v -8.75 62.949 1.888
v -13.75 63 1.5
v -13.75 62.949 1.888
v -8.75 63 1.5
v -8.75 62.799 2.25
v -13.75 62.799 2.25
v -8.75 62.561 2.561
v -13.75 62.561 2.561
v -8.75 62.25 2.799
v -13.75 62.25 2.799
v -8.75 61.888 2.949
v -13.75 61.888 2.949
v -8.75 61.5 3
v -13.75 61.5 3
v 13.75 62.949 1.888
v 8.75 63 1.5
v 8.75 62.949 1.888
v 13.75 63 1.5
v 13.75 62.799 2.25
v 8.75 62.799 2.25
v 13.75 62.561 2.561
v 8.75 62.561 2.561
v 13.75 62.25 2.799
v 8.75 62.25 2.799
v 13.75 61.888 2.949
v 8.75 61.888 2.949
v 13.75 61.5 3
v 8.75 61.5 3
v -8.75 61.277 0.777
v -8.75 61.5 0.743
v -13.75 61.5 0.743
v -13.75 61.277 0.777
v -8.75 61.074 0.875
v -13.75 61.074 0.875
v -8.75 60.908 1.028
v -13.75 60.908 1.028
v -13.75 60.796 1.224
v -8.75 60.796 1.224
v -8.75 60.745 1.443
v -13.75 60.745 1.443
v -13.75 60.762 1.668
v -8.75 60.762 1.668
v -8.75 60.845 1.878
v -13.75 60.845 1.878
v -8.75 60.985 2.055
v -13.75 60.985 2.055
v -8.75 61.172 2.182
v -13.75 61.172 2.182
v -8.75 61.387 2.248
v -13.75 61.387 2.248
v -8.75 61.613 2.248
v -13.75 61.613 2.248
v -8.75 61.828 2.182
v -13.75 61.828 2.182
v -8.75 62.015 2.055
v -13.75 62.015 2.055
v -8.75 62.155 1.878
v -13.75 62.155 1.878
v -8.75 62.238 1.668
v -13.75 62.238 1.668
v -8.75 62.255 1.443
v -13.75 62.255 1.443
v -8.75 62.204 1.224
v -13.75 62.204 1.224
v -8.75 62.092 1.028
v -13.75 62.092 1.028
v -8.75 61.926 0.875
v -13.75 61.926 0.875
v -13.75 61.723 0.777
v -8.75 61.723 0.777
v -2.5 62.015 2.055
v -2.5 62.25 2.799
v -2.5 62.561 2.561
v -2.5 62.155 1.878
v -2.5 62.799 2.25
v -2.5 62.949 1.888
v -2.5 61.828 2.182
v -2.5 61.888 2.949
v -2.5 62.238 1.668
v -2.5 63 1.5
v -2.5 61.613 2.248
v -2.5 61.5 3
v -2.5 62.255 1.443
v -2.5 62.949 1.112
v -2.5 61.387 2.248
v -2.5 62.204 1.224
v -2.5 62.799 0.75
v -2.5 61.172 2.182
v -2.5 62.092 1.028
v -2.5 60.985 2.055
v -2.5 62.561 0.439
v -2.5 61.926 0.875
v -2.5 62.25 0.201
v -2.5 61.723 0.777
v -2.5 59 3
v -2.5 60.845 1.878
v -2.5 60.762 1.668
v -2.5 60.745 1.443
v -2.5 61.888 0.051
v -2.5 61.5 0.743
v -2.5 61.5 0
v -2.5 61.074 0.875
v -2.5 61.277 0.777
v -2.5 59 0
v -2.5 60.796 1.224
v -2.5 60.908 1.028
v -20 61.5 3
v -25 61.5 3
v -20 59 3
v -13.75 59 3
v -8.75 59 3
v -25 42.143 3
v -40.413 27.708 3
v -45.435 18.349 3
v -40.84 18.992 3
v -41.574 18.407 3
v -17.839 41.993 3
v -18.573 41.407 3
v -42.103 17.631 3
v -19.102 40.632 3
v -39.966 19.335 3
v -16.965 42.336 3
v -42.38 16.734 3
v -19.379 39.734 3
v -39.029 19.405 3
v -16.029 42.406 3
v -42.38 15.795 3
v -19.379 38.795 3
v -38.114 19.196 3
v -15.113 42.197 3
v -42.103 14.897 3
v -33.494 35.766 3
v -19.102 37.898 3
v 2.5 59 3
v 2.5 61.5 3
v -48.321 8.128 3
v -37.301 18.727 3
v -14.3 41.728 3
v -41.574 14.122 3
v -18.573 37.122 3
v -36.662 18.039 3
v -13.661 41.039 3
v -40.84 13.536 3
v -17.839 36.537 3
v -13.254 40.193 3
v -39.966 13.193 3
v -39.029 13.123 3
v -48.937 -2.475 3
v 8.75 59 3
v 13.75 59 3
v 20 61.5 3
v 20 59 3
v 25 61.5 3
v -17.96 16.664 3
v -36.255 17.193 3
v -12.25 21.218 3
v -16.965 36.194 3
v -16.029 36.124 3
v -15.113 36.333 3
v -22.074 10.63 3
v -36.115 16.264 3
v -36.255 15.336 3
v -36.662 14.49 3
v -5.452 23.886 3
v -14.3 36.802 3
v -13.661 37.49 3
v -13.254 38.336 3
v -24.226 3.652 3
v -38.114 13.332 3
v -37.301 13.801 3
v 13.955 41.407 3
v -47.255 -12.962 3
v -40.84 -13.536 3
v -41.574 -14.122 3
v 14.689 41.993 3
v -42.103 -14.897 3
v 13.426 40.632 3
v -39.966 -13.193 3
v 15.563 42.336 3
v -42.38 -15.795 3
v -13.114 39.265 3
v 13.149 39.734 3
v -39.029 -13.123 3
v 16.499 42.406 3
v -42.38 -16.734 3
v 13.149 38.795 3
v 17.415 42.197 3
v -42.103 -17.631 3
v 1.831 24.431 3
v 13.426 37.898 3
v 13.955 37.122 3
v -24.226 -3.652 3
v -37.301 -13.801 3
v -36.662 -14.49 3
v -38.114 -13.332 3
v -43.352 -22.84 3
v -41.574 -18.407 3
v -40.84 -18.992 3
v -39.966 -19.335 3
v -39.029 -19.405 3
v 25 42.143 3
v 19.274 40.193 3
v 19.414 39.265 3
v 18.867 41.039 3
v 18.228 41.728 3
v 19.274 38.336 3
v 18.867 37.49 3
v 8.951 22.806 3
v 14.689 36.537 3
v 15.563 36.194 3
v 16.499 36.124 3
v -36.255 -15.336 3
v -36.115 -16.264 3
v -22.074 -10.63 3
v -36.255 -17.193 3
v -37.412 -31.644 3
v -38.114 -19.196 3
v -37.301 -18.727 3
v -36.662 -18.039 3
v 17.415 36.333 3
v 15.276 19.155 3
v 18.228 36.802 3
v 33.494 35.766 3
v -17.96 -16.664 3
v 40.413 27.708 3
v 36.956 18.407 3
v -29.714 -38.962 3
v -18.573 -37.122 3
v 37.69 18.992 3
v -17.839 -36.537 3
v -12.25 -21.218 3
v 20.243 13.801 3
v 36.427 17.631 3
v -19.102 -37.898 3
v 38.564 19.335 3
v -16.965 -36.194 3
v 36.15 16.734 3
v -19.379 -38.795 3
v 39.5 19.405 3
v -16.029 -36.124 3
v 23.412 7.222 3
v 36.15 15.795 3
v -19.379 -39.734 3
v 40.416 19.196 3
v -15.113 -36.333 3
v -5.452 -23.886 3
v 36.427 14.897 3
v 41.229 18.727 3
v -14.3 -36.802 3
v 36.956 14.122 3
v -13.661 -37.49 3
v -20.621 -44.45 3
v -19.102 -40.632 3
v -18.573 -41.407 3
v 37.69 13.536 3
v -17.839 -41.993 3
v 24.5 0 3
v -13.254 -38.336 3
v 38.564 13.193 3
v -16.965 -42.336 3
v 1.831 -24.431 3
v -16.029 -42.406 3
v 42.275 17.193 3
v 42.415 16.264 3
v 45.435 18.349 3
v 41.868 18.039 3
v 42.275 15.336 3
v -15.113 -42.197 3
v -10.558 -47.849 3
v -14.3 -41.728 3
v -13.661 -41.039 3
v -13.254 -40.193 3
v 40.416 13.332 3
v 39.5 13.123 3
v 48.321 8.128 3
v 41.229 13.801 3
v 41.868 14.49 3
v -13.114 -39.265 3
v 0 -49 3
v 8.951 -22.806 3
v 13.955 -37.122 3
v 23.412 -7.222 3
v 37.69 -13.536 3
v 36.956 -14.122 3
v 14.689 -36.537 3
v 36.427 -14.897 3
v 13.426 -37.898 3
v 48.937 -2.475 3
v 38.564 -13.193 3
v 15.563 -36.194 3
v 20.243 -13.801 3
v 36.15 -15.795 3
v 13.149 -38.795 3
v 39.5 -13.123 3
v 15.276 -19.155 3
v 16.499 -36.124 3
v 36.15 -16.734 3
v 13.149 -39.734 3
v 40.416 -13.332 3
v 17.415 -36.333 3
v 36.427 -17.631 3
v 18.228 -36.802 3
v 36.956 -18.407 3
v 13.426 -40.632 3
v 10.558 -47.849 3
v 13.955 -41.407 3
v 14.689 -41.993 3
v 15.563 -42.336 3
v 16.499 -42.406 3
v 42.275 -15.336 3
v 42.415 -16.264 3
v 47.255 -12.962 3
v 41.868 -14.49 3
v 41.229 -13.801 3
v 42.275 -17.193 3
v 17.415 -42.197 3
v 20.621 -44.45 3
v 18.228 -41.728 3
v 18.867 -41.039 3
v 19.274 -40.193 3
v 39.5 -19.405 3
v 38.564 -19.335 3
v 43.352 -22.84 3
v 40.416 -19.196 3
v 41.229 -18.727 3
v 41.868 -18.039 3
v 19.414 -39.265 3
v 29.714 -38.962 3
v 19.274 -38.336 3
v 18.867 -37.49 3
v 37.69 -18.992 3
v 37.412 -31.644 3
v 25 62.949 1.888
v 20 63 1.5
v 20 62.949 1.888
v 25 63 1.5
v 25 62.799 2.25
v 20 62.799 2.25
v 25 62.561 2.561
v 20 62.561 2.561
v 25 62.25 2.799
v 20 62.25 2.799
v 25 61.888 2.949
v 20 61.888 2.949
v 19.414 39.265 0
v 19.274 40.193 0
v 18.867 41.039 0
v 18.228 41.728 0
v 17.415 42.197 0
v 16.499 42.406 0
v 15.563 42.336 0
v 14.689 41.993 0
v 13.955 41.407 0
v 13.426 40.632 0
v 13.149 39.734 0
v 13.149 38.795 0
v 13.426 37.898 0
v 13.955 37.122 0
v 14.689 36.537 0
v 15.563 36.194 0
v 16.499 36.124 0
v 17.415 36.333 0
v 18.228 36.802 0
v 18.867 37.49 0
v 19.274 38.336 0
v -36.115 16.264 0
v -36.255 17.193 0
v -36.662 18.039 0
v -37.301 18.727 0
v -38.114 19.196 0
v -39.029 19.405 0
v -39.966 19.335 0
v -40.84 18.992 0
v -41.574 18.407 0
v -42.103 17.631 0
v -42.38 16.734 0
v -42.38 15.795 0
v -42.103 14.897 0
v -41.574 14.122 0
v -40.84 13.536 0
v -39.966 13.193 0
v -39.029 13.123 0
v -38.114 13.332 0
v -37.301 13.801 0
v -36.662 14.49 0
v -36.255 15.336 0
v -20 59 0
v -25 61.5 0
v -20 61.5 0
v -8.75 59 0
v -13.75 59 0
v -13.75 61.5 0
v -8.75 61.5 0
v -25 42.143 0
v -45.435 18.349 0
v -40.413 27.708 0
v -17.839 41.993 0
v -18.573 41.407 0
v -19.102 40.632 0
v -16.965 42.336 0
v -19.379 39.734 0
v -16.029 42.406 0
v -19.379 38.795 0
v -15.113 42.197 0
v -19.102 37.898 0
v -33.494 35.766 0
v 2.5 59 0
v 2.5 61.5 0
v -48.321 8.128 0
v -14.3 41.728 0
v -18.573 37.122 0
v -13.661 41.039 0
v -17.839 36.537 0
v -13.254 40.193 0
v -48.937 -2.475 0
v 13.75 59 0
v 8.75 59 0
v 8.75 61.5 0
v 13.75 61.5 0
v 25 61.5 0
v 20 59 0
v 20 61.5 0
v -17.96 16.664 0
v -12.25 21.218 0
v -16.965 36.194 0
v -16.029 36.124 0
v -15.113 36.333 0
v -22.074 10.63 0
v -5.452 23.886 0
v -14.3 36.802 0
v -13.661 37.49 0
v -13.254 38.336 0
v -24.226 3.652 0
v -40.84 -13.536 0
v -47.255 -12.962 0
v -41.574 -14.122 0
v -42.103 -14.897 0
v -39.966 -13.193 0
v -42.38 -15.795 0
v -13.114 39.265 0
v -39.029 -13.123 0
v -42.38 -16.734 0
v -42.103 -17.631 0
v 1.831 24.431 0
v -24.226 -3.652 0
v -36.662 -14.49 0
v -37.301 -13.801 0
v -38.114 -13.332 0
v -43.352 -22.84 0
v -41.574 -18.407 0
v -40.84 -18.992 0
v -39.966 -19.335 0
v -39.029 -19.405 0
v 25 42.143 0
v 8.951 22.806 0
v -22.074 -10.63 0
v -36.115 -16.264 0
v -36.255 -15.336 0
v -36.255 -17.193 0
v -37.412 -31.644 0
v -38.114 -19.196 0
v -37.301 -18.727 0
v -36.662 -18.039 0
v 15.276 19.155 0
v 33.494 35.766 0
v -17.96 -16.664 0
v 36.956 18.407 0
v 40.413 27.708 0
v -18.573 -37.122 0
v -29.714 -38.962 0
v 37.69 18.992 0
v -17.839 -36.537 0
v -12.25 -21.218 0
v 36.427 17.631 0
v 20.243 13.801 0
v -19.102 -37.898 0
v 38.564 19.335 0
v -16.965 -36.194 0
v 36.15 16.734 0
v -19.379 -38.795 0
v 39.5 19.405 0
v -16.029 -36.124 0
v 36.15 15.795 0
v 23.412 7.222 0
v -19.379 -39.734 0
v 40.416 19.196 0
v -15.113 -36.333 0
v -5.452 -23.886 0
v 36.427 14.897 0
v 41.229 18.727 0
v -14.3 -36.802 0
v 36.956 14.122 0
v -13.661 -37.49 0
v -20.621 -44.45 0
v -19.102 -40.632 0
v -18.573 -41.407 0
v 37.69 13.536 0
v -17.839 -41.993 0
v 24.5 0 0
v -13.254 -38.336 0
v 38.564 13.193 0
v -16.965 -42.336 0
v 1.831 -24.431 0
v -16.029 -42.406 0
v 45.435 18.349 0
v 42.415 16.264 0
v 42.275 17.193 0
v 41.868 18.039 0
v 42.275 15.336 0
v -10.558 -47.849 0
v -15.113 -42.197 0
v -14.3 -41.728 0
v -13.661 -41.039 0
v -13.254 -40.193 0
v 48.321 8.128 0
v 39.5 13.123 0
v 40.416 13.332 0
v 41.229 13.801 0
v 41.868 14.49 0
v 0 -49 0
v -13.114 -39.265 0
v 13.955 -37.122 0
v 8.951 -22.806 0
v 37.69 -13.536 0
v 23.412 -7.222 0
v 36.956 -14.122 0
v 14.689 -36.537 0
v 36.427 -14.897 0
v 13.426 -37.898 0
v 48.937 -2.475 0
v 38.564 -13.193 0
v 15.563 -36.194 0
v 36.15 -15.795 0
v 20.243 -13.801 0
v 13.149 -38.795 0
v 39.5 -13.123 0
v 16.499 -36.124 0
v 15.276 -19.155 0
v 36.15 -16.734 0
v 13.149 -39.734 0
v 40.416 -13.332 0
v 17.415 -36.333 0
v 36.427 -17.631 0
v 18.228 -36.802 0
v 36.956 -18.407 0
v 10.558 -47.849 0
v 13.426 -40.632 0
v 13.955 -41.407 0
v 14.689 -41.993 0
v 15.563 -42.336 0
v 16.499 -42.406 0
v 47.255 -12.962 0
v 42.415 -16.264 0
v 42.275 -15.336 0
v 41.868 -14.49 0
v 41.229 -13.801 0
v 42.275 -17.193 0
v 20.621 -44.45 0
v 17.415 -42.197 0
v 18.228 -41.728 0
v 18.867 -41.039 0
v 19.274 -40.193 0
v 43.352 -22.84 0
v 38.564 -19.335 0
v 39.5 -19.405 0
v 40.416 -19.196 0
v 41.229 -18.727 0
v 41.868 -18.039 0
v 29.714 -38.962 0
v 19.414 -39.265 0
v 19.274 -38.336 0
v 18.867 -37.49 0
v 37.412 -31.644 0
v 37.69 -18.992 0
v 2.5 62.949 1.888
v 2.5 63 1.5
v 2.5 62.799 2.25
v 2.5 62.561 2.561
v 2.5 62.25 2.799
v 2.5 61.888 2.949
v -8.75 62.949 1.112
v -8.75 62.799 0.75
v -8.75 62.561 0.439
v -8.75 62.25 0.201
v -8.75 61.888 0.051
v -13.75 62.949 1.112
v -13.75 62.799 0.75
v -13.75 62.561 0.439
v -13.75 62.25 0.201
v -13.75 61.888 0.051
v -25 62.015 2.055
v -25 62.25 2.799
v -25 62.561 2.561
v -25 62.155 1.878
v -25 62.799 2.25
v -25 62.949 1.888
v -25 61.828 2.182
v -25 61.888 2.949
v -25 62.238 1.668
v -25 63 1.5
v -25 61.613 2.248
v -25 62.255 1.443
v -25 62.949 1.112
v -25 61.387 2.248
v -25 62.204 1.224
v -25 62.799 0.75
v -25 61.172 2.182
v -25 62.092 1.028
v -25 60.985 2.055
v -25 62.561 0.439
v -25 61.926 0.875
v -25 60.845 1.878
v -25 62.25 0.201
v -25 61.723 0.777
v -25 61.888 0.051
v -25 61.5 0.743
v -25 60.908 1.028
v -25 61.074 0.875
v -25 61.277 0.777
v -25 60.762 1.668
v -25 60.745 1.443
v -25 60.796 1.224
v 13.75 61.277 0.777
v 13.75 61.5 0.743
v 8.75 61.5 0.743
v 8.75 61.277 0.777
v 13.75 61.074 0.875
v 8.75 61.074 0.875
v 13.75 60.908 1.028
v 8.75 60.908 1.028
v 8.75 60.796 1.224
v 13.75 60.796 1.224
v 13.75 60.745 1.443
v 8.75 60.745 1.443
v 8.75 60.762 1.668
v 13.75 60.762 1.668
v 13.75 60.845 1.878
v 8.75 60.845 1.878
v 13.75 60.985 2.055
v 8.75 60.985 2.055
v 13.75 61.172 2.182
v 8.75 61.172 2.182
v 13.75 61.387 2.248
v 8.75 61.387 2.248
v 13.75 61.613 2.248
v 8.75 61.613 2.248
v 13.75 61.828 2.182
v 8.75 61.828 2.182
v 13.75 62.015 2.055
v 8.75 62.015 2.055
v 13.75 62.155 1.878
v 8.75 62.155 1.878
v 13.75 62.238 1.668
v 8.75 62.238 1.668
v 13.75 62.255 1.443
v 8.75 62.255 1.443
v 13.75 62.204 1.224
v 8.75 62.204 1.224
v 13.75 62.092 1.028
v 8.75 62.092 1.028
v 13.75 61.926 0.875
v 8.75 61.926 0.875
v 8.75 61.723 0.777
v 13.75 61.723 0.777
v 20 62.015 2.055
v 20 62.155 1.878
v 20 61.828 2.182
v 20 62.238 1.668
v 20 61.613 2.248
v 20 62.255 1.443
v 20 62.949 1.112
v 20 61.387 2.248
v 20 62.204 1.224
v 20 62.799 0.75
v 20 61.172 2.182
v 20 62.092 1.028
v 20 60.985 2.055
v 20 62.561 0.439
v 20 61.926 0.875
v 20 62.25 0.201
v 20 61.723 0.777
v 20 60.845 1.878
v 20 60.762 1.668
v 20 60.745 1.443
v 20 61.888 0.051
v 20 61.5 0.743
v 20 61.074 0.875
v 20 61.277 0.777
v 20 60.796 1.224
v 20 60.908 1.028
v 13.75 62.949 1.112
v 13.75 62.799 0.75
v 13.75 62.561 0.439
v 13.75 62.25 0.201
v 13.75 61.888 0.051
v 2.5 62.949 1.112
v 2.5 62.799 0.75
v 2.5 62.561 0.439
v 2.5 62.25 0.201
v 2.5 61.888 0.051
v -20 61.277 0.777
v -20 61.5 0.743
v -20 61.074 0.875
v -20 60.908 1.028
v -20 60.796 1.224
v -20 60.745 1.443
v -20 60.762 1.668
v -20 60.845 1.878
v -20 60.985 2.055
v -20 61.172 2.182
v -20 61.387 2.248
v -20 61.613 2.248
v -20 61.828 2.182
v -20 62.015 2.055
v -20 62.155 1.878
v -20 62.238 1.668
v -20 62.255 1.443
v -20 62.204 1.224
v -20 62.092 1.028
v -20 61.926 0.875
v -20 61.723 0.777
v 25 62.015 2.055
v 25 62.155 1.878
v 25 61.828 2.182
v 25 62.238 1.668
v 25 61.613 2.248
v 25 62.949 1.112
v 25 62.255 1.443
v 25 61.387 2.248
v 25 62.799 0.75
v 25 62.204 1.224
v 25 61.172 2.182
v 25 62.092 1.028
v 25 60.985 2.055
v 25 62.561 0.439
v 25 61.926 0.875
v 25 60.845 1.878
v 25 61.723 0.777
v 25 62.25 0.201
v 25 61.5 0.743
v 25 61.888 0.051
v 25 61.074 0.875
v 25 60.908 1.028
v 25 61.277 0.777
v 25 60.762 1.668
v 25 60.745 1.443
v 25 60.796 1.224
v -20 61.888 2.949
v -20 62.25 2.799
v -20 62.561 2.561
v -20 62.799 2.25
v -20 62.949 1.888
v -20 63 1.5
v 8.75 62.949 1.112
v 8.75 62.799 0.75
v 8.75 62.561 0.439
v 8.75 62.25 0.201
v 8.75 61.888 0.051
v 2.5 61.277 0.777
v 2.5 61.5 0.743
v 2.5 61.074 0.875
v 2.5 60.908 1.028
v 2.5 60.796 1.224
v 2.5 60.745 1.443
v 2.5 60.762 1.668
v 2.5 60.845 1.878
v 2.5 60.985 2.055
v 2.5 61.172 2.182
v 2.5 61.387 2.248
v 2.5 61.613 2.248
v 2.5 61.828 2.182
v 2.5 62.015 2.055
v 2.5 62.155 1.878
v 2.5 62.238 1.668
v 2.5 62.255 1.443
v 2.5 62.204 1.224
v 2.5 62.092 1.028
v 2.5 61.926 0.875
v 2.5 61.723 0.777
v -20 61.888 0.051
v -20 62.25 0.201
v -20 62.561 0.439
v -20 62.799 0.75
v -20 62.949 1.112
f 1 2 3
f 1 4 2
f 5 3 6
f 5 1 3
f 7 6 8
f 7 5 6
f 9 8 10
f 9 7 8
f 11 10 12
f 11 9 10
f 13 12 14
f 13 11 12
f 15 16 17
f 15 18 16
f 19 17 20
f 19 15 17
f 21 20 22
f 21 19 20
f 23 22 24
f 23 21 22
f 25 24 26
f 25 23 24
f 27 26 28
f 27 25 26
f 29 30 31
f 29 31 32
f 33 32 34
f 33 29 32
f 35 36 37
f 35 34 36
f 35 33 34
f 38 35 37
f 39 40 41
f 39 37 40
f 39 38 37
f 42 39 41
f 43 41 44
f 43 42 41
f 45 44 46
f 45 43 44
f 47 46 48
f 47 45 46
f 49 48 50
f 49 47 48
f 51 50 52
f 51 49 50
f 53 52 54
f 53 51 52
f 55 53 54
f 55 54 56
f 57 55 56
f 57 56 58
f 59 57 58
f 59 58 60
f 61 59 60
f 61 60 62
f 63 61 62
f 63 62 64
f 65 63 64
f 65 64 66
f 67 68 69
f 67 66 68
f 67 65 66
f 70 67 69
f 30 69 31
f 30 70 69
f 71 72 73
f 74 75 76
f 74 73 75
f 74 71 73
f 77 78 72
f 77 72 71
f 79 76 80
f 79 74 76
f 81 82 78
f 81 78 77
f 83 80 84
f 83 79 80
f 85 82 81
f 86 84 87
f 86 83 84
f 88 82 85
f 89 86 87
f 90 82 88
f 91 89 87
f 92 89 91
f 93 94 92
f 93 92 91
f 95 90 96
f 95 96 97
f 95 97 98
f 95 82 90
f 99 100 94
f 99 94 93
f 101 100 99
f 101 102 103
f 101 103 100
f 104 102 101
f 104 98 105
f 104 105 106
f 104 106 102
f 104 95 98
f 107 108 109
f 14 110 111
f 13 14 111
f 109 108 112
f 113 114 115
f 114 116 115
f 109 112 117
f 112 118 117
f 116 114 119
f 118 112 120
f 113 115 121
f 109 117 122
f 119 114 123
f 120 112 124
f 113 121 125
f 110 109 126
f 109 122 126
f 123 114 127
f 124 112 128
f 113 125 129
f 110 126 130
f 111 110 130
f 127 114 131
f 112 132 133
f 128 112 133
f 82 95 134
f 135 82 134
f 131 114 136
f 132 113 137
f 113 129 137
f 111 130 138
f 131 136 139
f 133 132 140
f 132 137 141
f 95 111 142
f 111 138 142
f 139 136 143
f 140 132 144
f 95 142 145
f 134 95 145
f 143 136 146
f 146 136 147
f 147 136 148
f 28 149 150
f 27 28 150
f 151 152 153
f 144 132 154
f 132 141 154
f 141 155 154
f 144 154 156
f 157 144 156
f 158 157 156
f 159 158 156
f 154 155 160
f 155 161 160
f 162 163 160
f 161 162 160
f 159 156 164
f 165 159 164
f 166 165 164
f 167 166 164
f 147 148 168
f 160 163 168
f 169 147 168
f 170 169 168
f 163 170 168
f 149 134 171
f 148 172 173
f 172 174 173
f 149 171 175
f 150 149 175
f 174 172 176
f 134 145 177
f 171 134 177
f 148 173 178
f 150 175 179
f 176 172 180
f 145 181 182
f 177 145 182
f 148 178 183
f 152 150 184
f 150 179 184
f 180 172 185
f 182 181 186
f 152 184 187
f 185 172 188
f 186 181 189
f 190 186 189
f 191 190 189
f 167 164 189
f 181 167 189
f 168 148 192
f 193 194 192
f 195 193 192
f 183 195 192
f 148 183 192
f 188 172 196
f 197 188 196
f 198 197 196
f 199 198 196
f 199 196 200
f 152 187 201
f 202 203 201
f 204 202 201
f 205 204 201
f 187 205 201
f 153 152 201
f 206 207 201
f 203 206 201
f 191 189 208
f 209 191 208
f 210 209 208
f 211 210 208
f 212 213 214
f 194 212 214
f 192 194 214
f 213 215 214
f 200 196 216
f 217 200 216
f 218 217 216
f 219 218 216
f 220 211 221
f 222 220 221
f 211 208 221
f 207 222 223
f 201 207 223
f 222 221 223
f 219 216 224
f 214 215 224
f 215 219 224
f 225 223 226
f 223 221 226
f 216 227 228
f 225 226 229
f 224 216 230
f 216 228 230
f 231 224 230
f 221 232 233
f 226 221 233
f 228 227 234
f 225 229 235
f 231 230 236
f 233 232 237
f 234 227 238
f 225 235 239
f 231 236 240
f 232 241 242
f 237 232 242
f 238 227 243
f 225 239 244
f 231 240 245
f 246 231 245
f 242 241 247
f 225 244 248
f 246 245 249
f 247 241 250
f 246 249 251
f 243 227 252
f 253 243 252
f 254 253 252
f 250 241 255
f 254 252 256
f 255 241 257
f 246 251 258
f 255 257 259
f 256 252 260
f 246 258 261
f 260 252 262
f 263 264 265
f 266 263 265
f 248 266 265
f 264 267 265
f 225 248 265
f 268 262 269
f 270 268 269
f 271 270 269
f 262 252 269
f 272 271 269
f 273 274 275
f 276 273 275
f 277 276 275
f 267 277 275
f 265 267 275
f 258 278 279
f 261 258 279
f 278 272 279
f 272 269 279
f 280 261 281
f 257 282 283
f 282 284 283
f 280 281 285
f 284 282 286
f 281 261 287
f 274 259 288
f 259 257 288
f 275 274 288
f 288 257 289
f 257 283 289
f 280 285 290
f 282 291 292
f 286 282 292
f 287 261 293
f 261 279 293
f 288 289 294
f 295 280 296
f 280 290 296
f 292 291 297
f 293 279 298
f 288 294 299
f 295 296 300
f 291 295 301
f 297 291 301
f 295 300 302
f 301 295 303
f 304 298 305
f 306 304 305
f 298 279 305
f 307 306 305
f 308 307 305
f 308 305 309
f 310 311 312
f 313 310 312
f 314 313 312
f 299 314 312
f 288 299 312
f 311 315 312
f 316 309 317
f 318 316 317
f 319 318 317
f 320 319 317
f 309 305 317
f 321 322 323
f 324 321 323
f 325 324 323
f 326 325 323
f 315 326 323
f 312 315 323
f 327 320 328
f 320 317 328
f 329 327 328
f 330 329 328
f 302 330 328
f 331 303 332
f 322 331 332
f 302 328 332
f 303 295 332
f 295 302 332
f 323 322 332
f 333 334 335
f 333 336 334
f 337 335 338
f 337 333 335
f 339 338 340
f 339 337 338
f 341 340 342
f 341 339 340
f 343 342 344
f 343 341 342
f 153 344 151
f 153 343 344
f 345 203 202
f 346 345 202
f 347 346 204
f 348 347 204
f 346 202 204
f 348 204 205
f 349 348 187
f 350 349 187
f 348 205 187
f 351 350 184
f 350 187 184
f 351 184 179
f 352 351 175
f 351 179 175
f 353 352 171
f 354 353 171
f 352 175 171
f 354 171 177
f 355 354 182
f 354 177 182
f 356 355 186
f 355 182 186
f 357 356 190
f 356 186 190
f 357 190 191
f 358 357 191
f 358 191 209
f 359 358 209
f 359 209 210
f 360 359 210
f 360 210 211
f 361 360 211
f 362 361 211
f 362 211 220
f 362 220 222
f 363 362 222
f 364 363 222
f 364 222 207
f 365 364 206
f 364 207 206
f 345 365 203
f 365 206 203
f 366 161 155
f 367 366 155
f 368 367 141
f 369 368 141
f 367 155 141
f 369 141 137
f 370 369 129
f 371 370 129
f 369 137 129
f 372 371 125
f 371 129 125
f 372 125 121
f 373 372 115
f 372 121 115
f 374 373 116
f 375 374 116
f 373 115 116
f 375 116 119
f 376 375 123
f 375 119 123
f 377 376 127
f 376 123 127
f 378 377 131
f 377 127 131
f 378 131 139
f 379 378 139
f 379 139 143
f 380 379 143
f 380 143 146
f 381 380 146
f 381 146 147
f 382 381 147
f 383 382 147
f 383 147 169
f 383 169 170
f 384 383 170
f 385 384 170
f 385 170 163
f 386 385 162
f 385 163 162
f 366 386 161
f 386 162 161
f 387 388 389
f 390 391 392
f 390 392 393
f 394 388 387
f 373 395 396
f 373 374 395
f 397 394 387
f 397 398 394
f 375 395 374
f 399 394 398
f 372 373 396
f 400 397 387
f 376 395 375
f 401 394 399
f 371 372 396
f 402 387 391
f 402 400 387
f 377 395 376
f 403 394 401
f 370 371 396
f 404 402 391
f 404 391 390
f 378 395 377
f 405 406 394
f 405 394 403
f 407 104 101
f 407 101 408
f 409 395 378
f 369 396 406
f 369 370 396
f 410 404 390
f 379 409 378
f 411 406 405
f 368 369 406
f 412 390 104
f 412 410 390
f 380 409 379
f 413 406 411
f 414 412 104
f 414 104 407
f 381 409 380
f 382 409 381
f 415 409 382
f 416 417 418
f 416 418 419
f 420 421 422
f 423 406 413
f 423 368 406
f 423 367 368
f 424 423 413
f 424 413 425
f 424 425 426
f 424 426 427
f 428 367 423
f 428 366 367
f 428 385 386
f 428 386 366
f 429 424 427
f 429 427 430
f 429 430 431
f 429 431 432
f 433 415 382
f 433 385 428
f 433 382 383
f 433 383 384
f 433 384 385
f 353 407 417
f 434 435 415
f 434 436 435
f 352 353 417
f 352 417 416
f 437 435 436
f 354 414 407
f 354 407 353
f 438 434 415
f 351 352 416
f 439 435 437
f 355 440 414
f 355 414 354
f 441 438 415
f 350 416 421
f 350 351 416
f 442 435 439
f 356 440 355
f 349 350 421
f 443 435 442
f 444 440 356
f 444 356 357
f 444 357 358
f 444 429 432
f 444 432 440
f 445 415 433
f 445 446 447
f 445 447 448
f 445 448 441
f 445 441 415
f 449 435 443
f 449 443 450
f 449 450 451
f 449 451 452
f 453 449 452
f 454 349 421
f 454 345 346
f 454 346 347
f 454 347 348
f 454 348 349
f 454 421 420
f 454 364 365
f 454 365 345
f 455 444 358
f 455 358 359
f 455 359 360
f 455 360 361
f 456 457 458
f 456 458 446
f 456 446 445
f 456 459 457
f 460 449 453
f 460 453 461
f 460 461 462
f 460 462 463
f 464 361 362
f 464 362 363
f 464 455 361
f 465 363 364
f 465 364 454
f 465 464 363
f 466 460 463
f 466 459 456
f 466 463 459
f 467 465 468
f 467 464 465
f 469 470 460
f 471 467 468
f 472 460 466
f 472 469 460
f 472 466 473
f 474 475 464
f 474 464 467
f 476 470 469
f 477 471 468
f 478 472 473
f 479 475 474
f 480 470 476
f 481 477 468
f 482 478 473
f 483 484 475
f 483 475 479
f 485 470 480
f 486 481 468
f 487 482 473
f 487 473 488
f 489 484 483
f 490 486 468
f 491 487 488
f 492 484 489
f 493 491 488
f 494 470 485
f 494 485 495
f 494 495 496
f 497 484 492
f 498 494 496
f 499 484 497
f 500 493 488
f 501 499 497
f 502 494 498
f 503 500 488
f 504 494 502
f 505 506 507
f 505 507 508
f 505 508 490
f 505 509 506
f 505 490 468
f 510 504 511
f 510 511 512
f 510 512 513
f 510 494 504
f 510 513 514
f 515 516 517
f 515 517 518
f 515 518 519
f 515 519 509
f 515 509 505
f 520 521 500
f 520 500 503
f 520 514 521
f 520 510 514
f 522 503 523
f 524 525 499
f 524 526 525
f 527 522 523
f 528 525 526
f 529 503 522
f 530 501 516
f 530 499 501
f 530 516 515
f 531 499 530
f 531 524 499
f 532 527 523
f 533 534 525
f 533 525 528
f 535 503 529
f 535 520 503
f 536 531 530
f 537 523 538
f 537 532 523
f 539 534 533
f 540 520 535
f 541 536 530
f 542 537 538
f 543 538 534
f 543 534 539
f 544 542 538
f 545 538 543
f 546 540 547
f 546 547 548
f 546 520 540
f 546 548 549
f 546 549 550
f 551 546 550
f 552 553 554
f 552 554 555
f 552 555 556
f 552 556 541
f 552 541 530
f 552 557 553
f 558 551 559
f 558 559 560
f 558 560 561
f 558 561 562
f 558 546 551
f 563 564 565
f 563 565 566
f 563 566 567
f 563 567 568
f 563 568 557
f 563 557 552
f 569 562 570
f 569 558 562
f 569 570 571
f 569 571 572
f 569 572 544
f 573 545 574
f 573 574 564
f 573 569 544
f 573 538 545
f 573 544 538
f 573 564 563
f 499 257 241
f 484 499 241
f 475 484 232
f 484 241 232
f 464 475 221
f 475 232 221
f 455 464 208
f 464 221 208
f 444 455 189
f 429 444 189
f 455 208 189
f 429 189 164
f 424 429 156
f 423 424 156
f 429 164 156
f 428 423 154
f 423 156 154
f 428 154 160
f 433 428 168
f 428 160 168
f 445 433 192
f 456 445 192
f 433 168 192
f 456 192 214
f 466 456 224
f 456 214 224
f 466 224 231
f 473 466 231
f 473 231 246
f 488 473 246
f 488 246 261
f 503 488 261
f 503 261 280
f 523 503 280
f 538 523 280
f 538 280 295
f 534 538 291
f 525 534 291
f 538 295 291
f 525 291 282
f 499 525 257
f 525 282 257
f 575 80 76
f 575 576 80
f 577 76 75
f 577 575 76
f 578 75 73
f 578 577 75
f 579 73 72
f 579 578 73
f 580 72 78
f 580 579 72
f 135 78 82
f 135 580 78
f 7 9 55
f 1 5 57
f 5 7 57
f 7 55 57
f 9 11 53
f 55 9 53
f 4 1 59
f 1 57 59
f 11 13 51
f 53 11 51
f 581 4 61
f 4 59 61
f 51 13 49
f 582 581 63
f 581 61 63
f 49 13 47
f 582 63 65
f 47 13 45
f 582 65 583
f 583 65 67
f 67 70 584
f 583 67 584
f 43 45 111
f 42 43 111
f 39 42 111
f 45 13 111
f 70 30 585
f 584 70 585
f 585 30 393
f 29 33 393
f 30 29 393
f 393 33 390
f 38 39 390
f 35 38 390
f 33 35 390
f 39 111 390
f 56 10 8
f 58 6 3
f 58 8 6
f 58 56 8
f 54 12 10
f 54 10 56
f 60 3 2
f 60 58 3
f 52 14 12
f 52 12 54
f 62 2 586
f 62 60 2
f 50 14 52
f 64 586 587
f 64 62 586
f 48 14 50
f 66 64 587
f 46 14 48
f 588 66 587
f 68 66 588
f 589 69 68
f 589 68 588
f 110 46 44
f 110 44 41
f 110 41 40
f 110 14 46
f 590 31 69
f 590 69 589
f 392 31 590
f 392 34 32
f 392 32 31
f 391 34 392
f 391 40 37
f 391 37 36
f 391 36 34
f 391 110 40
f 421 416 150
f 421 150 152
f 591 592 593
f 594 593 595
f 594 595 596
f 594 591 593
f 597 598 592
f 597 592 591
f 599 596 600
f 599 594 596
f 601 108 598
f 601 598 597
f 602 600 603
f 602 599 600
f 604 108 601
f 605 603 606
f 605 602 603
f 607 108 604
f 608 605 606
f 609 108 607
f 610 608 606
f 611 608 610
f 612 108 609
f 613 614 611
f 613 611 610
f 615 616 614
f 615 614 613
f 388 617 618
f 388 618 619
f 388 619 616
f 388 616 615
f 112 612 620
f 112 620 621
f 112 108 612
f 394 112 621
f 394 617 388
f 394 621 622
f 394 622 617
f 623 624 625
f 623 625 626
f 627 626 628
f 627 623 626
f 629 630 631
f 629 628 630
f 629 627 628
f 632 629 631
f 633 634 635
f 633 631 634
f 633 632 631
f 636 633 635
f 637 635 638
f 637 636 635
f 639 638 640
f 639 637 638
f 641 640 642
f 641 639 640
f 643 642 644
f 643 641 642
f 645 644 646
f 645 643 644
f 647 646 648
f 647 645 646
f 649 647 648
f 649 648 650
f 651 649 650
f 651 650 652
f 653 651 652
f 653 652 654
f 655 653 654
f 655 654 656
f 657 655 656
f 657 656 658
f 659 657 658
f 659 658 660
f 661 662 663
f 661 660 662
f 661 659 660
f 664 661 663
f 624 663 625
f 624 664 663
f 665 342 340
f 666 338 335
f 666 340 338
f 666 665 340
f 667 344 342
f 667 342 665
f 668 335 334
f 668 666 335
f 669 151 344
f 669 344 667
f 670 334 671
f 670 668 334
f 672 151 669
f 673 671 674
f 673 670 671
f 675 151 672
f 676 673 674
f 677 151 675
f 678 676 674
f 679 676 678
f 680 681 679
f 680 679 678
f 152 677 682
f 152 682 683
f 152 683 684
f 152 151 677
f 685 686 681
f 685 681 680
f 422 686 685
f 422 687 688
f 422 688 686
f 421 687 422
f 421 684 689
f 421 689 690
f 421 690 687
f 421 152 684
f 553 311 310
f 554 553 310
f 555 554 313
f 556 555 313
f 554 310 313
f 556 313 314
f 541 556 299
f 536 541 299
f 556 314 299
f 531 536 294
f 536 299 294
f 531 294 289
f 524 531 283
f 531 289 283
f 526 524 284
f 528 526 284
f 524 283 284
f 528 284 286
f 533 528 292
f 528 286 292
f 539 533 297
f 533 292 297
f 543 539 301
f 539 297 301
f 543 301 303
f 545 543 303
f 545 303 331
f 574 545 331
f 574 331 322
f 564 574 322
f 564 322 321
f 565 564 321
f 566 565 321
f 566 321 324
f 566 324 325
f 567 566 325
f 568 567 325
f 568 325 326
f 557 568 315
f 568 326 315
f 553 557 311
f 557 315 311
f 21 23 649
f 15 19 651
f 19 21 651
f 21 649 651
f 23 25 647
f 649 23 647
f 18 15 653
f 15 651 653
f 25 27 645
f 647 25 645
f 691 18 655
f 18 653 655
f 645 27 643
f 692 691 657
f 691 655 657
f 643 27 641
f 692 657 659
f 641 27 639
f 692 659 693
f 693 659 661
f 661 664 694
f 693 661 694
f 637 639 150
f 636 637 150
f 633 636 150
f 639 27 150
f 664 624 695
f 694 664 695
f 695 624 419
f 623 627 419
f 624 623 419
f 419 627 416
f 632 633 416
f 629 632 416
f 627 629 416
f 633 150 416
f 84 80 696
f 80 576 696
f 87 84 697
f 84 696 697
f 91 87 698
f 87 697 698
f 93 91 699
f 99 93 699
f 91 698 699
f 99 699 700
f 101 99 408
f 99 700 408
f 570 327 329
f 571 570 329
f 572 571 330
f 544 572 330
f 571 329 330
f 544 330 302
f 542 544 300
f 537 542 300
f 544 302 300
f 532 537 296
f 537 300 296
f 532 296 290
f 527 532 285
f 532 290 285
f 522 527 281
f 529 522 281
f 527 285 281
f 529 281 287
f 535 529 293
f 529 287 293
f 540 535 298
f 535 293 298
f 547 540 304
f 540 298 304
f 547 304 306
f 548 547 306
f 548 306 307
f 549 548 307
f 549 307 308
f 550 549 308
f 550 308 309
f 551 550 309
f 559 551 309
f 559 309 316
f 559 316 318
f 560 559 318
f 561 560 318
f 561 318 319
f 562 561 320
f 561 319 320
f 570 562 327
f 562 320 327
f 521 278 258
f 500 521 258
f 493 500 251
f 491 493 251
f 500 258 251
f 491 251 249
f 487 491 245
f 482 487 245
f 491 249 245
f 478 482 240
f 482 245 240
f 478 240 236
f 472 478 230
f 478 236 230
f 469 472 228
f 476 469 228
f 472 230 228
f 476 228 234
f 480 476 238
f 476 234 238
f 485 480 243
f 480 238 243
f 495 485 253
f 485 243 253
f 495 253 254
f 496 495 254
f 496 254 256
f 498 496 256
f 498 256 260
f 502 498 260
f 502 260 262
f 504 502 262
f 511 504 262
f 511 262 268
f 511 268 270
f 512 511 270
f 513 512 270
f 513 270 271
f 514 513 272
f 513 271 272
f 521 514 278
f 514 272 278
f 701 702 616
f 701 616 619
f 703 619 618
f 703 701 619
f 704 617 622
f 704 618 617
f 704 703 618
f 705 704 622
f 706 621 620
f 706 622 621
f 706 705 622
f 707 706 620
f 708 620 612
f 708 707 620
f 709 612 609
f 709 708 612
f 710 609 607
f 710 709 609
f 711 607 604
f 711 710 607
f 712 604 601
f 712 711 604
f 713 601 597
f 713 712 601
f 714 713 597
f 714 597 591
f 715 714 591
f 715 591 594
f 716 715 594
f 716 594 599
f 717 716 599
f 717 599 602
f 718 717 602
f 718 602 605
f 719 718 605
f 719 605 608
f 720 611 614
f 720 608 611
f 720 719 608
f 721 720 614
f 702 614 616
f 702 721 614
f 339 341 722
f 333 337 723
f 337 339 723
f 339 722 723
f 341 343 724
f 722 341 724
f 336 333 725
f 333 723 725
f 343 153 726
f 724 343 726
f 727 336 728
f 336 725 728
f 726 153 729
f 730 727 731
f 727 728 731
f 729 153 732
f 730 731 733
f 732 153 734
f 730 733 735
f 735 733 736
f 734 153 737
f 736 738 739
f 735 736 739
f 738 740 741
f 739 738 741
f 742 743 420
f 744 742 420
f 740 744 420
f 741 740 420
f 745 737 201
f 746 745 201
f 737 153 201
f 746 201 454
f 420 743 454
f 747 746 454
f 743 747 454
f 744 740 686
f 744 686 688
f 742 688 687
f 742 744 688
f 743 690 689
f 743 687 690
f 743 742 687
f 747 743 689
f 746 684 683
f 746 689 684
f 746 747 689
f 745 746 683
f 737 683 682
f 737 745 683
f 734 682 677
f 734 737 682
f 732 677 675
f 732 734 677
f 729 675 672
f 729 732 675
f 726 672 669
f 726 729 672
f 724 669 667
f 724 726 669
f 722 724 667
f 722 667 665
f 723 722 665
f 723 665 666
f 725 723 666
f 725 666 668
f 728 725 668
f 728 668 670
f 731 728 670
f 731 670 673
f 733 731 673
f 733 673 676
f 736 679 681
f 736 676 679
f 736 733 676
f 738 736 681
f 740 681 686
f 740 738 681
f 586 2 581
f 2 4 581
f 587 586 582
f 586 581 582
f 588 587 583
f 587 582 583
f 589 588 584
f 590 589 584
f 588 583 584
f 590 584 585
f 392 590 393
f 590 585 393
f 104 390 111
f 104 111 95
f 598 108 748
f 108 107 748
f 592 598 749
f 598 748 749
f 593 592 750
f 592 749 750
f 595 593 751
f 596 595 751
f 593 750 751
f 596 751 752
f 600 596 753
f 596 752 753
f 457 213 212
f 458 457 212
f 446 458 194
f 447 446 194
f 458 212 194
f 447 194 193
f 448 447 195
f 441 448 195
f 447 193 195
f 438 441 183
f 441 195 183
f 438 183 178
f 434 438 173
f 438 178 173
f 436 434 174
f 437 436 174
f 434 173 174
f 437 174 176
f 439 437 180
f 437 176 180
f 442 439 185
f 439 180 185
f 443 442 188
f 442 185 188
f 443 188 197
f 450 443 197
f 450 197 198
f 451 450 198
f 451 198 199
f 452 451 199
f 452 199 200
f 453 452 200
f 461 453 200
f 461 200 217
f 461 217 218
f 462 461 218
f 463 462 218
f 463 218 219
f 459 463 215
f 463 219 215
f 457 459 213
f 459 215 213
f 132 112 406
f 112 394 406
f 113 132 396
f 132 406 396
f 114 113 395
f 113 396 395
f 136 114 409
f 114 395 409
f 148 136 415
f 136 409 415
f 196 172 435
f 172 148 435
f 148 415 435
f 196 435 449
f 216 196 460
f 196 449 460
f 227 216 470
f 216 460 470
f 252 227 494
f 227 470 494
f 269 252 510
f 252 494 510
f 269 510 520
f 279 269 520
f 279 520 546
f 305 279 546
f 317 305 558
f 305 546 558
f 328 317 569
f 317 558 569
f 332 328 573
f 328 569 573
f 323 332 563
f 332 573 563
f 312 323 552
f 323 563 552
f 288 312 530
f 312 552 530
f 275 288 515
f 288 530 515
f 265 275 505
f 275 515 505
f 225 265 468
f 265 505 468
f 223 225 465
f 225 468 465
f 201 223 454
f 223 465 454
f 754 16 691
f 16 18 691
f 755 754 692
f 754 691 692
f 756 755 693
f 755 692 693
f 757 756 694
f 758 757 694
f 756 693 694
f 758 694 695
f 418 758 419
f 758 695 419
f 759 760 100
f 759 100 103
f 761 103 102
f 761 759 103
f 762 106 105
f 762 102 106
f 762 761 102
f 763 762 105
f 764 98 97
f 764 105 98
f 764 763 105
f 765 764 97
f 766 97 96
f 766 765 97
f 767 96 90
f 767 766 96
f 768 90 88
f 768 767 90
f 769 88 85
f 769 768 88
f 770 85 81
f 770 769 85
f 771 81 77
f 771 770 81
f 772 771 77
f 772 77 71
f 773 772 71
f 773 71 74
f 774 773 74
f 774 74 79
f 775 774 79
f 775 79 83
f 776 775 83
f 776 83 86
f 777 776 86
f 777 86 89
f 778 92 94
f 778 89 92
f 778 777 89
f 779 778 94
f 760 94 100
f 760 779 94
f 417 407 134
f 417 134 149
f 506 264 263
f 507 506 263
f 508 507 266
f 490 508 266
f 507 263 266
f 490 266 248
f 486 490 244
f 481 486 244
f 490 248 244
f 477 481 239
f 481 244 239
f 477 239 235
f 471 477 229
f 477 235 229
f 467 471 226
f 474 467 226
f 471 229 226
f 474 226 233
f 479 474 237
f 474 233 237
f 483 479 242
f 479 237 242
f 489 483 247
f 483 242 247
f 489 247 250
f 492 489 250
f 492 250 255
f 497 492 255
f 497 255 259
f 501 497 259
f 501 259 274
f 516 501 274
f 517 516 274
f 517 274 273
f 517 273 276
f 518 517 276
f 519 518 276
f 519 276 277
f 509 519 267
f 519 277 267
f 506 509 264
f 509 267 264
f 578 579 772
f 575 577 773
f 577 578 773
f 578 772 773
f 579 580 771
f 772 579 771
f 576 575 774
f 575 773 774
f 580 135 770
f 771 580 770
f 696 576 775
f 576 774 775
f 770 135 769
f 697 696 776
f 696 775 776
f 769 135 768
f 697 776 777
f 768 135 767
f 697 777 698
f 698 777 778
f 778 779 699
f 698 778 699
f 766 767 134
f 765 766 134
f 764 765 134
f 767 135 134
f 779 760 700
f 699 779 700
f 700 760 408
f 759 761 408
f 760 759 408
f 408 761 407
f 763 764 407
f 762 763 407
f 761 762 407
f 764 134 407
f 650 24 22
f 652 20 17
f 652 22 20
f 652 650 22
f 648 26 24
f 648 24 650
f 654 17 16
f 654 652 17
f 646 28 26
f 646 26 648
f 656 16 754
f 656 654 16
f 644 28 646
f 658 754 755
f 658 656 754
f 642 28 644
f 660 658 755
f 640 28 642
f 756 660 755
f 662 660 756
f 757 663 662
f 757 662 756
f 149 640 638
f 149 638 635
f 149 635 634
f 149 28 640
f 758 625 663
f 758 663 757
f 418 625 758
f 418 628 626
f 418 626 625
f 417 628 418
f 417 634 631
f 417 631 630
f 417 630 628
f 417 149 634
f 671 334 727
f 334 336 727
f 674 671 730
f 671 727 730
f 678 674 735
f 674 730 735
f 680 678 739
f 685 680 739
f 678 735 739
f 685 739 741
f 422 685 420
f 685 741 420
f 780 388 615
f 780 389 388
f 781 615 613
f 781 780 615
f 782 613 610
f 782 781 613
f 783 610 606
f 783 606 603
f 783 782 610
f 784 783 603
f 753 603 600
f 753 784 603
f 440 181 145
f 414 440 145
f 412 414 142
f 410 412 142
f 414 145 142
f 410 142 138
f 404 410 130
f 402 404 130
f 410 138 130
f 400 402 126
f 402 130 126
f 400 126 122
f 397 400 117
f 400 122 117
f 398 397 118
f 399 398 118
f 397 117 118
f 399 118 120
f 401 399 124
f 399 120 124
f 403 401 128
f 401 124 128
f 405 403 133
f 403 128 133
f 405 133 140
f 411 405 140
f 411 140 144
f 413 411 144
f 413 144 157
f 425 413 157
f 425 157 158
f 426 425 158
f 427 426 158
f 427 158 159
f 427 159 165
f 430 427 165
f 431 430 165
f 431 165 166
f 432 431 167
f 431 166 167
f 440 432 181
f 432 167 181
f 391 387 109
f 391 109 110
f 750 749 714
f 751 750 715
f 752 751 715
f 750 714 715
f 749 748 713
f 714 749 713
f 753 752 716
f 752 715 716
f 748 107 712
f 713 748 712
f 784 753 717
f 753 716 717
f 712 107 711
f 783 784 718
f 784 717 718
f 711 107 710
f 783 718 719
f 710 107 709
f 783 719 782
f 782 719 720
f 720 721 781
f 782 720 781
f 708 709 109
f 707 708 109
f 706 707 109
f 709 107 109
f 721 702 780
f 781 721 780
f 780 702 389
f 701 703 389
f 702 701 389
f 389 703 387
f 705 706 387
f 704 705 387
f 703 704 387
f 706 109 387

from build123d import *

# Parameters (mm, degrees)
SKETCH1_R                            = 49
BOSS_EXTRUDE1_DEPTH                  = 3
SKETCH2_R                            = 24.5
CUT_EXTRUDE1_DEPTH                   = 3
SKETCH3_R                            = 3.150000005
CUT_EXTRUDE2_DEPTH                   = 3
SKETCH5_W                            = 50
SKETCH5_H                            = 3
BOSS_EXTRUDE3_DEPTH                  = 10
BOSS_EXTRUDE3_DIRECTION_2_REACH      = 111.608
BOSS_EXTRUDE3_DIRECTION_2_END_RADIUS = 49
SKETCH6_W                            = 5
SKETCH6_H                            = 3
BOSS_EXTRUDE4_DEPTH                  = 4
FILLET1_R                            = 1.5
LPATTERN3_COUNT                      = 5
LPATTERN3_PITCH                      = 11.25
FILLET1_OF_LPATTERN3_R               = 1.5
CUT_EXTRUDE3_DEPTH                   = 98.231682079
CUT_EXTRUDE3_DEPTH_BACK              = 98.231682079
SKETCH7_R                            = 0.756640097


with BuildPart() as part:
    # Sketch1 → Boss-Extrude1 (new body)
    with BuildSketch(Plane.XY):
        Circle(SKETCH1_R)
    extrude(amount=BOSS_EXTRUDE1_DEPTH)

    # Sketch2 → Cut-Extrude1 (cut)
    with BuildSketch(Plane.XY.offset(3)):
        Circle(SKETCH2_R)
    extrude(amount=-CUT_EXTRUDE1_DEPTH, mode=Mode.SUBTRACT)

    # Sketch3 → Cut-Extrude2 (cut)
    with BuildSketch(Plane.XY.offset(3)):
        with Locations((16.264045876, -39.264880132)):
            Circle(SKETCH3_R)
        with Locations((39.264880132, -16.264045875)):
            Circle(SKETCH3_R)
        with Locations((39.264880132, 16.264045876)):
            Circle(SKETCH3_R)
        with Locations((16.264045876, 39.264880132)):
            Circle(SKETCH3_R)
        with Locations((-16.264045875, 39.264880132)):
            Circle(SKETCH3_R)
        with Locations((-39.264880132, 16.264045876)):
            Circle(SKETCH3_R)
        with Locations((-39.264880132, -16.264045875)):
            Circle(SKETCH3_R)
        with Locations((-16.264045875, -39.264880132)):
            Circle(SKETCH3_R)
    extrude(amount=-CUT_EXTRUDE2_DEPTH, mode=Mode.SUBTRACT)

    # Sketch5 → Boss-Extrude3 (add)
    with BuildSketch(Plane(origin=(0, 49, 0), x_dir=(1, 0, 0), z_dir=(0, 1, 0))):
        with Locations((0, -1.5)):
            Rectangle(SKETCH5_W, SKETCH5_H)
    extrude(amount=BOSS_EXTRUDE3_DEPTH)

    # Boss-Extrude3 direction 2: up to this cylinder (the profile starts outside it)
    boss_extrude3_direction_2_end = Plane(origin=(0, 0, 1.5), z_dir=(0, 0, -1)) * Cylinder(BOSS_EXTRUDE3_DIRECTION_2_END_RADIUS, 322.216, mode=Mode.PRIVATE)
    # Sketch5 → Boss-Extrude3 direction 2 (add, up to the surface)
    with BuildSketch(Plane(origin=(0, 49, 0), x_dir=(1, 0, 0), z_dir=(0, 1, 0)), mode=Mode.PRIVATE) as boss_extrude3_direction_2_sk1:
        with Locations((0, -1.5)):
            Rectangle(SKETCH5_W, SKETCH5_H)
    boss_extrude3_direction_2_tool1 = extrude(boss_extrude3_direction_2_sk1.sketch, amount=-BOSS_EXTRUDE3_DIRECTION_2_REACH, mode=Mode.PRIVATE) - boss_extrude3_direction_2_end
    add(boss_extrude3_direction_2_tool1.solids().sort_by_distance((0, 49, 1.5))[0])
    add(boss_extrude3_direction_2_tool1.solids().sort_by_distance((0, 49, 1.5))[1])

    # Sketch6 → Boss-Extrude4 (add)
    with BuildSketch(Plane(origin=(0, 59, 0), x_dir=(1, 0, 0), z_dir=(0, 1, 0))):
        with Locations((-22.5, -1.5)):
            Rectangle(SKETCH6_W, SKETCH6_H)
    boss_extrude4 = extrude(amount=BOSS_EXTRUDE4_DEPTH)

    # Fillet1
    fillet1_edges = [part.edges().sort_by_distance(p)[0] for p in [
        (-22.5, 63, 0),
        (-22.5, 63, 3),
    ]]
    fillet(fillet1_edges, radius=FILLET1_R - 0.0001)  # a hair under: the kernel refuses the full size

    # LPattern3: Boss-Extrude4 ×5
    with Locations(*[(i * LPATTERN3_PITCH, 0, 0) for i in range(1, LPATTERN3_COUNT)]):
        add(boss_extrude4)

    # Fillet1 of LPattern3
    fillet1_of_lpattern3_edges = [part.edges().sort_by_distance(p)[0] for p in [
        (-11.25, 63, 0),
        (-11.25, 63, 3),
        (0, 63, 0),
        (0, 63, 3),
        (11.25, 63, 0),
        (11.25, 63, 3),
        (22.5, 63, 0),
        (22.5, 63, 3),
    ]]
    fillet(fillet1_of_lpattern3_edges, radius=FILLET1_OF_LPATTERN3_R - 0.0001)  # a hair under: the kernel refuses the full size

    # Sketch7 → Cut-Extrude3 (cut, two sides: drawn at the far end of the back side and taken through both)
    with BuildSketch(Plane.ZY.offset(25).offset(-CUT_EXTRUDE3_DEPTH_BACK)):
        with Locations(Location((1.5, 61.5, 0), (0, 0, 180))):
            Circle(SKETCH7_R)
    extrude(amount=CUT_EXTRUDE3_DEPTH + CUT_EXTRUDE3_DEPTH_BACK, mode=Mode.SUBTRACT)


solid = part.part
